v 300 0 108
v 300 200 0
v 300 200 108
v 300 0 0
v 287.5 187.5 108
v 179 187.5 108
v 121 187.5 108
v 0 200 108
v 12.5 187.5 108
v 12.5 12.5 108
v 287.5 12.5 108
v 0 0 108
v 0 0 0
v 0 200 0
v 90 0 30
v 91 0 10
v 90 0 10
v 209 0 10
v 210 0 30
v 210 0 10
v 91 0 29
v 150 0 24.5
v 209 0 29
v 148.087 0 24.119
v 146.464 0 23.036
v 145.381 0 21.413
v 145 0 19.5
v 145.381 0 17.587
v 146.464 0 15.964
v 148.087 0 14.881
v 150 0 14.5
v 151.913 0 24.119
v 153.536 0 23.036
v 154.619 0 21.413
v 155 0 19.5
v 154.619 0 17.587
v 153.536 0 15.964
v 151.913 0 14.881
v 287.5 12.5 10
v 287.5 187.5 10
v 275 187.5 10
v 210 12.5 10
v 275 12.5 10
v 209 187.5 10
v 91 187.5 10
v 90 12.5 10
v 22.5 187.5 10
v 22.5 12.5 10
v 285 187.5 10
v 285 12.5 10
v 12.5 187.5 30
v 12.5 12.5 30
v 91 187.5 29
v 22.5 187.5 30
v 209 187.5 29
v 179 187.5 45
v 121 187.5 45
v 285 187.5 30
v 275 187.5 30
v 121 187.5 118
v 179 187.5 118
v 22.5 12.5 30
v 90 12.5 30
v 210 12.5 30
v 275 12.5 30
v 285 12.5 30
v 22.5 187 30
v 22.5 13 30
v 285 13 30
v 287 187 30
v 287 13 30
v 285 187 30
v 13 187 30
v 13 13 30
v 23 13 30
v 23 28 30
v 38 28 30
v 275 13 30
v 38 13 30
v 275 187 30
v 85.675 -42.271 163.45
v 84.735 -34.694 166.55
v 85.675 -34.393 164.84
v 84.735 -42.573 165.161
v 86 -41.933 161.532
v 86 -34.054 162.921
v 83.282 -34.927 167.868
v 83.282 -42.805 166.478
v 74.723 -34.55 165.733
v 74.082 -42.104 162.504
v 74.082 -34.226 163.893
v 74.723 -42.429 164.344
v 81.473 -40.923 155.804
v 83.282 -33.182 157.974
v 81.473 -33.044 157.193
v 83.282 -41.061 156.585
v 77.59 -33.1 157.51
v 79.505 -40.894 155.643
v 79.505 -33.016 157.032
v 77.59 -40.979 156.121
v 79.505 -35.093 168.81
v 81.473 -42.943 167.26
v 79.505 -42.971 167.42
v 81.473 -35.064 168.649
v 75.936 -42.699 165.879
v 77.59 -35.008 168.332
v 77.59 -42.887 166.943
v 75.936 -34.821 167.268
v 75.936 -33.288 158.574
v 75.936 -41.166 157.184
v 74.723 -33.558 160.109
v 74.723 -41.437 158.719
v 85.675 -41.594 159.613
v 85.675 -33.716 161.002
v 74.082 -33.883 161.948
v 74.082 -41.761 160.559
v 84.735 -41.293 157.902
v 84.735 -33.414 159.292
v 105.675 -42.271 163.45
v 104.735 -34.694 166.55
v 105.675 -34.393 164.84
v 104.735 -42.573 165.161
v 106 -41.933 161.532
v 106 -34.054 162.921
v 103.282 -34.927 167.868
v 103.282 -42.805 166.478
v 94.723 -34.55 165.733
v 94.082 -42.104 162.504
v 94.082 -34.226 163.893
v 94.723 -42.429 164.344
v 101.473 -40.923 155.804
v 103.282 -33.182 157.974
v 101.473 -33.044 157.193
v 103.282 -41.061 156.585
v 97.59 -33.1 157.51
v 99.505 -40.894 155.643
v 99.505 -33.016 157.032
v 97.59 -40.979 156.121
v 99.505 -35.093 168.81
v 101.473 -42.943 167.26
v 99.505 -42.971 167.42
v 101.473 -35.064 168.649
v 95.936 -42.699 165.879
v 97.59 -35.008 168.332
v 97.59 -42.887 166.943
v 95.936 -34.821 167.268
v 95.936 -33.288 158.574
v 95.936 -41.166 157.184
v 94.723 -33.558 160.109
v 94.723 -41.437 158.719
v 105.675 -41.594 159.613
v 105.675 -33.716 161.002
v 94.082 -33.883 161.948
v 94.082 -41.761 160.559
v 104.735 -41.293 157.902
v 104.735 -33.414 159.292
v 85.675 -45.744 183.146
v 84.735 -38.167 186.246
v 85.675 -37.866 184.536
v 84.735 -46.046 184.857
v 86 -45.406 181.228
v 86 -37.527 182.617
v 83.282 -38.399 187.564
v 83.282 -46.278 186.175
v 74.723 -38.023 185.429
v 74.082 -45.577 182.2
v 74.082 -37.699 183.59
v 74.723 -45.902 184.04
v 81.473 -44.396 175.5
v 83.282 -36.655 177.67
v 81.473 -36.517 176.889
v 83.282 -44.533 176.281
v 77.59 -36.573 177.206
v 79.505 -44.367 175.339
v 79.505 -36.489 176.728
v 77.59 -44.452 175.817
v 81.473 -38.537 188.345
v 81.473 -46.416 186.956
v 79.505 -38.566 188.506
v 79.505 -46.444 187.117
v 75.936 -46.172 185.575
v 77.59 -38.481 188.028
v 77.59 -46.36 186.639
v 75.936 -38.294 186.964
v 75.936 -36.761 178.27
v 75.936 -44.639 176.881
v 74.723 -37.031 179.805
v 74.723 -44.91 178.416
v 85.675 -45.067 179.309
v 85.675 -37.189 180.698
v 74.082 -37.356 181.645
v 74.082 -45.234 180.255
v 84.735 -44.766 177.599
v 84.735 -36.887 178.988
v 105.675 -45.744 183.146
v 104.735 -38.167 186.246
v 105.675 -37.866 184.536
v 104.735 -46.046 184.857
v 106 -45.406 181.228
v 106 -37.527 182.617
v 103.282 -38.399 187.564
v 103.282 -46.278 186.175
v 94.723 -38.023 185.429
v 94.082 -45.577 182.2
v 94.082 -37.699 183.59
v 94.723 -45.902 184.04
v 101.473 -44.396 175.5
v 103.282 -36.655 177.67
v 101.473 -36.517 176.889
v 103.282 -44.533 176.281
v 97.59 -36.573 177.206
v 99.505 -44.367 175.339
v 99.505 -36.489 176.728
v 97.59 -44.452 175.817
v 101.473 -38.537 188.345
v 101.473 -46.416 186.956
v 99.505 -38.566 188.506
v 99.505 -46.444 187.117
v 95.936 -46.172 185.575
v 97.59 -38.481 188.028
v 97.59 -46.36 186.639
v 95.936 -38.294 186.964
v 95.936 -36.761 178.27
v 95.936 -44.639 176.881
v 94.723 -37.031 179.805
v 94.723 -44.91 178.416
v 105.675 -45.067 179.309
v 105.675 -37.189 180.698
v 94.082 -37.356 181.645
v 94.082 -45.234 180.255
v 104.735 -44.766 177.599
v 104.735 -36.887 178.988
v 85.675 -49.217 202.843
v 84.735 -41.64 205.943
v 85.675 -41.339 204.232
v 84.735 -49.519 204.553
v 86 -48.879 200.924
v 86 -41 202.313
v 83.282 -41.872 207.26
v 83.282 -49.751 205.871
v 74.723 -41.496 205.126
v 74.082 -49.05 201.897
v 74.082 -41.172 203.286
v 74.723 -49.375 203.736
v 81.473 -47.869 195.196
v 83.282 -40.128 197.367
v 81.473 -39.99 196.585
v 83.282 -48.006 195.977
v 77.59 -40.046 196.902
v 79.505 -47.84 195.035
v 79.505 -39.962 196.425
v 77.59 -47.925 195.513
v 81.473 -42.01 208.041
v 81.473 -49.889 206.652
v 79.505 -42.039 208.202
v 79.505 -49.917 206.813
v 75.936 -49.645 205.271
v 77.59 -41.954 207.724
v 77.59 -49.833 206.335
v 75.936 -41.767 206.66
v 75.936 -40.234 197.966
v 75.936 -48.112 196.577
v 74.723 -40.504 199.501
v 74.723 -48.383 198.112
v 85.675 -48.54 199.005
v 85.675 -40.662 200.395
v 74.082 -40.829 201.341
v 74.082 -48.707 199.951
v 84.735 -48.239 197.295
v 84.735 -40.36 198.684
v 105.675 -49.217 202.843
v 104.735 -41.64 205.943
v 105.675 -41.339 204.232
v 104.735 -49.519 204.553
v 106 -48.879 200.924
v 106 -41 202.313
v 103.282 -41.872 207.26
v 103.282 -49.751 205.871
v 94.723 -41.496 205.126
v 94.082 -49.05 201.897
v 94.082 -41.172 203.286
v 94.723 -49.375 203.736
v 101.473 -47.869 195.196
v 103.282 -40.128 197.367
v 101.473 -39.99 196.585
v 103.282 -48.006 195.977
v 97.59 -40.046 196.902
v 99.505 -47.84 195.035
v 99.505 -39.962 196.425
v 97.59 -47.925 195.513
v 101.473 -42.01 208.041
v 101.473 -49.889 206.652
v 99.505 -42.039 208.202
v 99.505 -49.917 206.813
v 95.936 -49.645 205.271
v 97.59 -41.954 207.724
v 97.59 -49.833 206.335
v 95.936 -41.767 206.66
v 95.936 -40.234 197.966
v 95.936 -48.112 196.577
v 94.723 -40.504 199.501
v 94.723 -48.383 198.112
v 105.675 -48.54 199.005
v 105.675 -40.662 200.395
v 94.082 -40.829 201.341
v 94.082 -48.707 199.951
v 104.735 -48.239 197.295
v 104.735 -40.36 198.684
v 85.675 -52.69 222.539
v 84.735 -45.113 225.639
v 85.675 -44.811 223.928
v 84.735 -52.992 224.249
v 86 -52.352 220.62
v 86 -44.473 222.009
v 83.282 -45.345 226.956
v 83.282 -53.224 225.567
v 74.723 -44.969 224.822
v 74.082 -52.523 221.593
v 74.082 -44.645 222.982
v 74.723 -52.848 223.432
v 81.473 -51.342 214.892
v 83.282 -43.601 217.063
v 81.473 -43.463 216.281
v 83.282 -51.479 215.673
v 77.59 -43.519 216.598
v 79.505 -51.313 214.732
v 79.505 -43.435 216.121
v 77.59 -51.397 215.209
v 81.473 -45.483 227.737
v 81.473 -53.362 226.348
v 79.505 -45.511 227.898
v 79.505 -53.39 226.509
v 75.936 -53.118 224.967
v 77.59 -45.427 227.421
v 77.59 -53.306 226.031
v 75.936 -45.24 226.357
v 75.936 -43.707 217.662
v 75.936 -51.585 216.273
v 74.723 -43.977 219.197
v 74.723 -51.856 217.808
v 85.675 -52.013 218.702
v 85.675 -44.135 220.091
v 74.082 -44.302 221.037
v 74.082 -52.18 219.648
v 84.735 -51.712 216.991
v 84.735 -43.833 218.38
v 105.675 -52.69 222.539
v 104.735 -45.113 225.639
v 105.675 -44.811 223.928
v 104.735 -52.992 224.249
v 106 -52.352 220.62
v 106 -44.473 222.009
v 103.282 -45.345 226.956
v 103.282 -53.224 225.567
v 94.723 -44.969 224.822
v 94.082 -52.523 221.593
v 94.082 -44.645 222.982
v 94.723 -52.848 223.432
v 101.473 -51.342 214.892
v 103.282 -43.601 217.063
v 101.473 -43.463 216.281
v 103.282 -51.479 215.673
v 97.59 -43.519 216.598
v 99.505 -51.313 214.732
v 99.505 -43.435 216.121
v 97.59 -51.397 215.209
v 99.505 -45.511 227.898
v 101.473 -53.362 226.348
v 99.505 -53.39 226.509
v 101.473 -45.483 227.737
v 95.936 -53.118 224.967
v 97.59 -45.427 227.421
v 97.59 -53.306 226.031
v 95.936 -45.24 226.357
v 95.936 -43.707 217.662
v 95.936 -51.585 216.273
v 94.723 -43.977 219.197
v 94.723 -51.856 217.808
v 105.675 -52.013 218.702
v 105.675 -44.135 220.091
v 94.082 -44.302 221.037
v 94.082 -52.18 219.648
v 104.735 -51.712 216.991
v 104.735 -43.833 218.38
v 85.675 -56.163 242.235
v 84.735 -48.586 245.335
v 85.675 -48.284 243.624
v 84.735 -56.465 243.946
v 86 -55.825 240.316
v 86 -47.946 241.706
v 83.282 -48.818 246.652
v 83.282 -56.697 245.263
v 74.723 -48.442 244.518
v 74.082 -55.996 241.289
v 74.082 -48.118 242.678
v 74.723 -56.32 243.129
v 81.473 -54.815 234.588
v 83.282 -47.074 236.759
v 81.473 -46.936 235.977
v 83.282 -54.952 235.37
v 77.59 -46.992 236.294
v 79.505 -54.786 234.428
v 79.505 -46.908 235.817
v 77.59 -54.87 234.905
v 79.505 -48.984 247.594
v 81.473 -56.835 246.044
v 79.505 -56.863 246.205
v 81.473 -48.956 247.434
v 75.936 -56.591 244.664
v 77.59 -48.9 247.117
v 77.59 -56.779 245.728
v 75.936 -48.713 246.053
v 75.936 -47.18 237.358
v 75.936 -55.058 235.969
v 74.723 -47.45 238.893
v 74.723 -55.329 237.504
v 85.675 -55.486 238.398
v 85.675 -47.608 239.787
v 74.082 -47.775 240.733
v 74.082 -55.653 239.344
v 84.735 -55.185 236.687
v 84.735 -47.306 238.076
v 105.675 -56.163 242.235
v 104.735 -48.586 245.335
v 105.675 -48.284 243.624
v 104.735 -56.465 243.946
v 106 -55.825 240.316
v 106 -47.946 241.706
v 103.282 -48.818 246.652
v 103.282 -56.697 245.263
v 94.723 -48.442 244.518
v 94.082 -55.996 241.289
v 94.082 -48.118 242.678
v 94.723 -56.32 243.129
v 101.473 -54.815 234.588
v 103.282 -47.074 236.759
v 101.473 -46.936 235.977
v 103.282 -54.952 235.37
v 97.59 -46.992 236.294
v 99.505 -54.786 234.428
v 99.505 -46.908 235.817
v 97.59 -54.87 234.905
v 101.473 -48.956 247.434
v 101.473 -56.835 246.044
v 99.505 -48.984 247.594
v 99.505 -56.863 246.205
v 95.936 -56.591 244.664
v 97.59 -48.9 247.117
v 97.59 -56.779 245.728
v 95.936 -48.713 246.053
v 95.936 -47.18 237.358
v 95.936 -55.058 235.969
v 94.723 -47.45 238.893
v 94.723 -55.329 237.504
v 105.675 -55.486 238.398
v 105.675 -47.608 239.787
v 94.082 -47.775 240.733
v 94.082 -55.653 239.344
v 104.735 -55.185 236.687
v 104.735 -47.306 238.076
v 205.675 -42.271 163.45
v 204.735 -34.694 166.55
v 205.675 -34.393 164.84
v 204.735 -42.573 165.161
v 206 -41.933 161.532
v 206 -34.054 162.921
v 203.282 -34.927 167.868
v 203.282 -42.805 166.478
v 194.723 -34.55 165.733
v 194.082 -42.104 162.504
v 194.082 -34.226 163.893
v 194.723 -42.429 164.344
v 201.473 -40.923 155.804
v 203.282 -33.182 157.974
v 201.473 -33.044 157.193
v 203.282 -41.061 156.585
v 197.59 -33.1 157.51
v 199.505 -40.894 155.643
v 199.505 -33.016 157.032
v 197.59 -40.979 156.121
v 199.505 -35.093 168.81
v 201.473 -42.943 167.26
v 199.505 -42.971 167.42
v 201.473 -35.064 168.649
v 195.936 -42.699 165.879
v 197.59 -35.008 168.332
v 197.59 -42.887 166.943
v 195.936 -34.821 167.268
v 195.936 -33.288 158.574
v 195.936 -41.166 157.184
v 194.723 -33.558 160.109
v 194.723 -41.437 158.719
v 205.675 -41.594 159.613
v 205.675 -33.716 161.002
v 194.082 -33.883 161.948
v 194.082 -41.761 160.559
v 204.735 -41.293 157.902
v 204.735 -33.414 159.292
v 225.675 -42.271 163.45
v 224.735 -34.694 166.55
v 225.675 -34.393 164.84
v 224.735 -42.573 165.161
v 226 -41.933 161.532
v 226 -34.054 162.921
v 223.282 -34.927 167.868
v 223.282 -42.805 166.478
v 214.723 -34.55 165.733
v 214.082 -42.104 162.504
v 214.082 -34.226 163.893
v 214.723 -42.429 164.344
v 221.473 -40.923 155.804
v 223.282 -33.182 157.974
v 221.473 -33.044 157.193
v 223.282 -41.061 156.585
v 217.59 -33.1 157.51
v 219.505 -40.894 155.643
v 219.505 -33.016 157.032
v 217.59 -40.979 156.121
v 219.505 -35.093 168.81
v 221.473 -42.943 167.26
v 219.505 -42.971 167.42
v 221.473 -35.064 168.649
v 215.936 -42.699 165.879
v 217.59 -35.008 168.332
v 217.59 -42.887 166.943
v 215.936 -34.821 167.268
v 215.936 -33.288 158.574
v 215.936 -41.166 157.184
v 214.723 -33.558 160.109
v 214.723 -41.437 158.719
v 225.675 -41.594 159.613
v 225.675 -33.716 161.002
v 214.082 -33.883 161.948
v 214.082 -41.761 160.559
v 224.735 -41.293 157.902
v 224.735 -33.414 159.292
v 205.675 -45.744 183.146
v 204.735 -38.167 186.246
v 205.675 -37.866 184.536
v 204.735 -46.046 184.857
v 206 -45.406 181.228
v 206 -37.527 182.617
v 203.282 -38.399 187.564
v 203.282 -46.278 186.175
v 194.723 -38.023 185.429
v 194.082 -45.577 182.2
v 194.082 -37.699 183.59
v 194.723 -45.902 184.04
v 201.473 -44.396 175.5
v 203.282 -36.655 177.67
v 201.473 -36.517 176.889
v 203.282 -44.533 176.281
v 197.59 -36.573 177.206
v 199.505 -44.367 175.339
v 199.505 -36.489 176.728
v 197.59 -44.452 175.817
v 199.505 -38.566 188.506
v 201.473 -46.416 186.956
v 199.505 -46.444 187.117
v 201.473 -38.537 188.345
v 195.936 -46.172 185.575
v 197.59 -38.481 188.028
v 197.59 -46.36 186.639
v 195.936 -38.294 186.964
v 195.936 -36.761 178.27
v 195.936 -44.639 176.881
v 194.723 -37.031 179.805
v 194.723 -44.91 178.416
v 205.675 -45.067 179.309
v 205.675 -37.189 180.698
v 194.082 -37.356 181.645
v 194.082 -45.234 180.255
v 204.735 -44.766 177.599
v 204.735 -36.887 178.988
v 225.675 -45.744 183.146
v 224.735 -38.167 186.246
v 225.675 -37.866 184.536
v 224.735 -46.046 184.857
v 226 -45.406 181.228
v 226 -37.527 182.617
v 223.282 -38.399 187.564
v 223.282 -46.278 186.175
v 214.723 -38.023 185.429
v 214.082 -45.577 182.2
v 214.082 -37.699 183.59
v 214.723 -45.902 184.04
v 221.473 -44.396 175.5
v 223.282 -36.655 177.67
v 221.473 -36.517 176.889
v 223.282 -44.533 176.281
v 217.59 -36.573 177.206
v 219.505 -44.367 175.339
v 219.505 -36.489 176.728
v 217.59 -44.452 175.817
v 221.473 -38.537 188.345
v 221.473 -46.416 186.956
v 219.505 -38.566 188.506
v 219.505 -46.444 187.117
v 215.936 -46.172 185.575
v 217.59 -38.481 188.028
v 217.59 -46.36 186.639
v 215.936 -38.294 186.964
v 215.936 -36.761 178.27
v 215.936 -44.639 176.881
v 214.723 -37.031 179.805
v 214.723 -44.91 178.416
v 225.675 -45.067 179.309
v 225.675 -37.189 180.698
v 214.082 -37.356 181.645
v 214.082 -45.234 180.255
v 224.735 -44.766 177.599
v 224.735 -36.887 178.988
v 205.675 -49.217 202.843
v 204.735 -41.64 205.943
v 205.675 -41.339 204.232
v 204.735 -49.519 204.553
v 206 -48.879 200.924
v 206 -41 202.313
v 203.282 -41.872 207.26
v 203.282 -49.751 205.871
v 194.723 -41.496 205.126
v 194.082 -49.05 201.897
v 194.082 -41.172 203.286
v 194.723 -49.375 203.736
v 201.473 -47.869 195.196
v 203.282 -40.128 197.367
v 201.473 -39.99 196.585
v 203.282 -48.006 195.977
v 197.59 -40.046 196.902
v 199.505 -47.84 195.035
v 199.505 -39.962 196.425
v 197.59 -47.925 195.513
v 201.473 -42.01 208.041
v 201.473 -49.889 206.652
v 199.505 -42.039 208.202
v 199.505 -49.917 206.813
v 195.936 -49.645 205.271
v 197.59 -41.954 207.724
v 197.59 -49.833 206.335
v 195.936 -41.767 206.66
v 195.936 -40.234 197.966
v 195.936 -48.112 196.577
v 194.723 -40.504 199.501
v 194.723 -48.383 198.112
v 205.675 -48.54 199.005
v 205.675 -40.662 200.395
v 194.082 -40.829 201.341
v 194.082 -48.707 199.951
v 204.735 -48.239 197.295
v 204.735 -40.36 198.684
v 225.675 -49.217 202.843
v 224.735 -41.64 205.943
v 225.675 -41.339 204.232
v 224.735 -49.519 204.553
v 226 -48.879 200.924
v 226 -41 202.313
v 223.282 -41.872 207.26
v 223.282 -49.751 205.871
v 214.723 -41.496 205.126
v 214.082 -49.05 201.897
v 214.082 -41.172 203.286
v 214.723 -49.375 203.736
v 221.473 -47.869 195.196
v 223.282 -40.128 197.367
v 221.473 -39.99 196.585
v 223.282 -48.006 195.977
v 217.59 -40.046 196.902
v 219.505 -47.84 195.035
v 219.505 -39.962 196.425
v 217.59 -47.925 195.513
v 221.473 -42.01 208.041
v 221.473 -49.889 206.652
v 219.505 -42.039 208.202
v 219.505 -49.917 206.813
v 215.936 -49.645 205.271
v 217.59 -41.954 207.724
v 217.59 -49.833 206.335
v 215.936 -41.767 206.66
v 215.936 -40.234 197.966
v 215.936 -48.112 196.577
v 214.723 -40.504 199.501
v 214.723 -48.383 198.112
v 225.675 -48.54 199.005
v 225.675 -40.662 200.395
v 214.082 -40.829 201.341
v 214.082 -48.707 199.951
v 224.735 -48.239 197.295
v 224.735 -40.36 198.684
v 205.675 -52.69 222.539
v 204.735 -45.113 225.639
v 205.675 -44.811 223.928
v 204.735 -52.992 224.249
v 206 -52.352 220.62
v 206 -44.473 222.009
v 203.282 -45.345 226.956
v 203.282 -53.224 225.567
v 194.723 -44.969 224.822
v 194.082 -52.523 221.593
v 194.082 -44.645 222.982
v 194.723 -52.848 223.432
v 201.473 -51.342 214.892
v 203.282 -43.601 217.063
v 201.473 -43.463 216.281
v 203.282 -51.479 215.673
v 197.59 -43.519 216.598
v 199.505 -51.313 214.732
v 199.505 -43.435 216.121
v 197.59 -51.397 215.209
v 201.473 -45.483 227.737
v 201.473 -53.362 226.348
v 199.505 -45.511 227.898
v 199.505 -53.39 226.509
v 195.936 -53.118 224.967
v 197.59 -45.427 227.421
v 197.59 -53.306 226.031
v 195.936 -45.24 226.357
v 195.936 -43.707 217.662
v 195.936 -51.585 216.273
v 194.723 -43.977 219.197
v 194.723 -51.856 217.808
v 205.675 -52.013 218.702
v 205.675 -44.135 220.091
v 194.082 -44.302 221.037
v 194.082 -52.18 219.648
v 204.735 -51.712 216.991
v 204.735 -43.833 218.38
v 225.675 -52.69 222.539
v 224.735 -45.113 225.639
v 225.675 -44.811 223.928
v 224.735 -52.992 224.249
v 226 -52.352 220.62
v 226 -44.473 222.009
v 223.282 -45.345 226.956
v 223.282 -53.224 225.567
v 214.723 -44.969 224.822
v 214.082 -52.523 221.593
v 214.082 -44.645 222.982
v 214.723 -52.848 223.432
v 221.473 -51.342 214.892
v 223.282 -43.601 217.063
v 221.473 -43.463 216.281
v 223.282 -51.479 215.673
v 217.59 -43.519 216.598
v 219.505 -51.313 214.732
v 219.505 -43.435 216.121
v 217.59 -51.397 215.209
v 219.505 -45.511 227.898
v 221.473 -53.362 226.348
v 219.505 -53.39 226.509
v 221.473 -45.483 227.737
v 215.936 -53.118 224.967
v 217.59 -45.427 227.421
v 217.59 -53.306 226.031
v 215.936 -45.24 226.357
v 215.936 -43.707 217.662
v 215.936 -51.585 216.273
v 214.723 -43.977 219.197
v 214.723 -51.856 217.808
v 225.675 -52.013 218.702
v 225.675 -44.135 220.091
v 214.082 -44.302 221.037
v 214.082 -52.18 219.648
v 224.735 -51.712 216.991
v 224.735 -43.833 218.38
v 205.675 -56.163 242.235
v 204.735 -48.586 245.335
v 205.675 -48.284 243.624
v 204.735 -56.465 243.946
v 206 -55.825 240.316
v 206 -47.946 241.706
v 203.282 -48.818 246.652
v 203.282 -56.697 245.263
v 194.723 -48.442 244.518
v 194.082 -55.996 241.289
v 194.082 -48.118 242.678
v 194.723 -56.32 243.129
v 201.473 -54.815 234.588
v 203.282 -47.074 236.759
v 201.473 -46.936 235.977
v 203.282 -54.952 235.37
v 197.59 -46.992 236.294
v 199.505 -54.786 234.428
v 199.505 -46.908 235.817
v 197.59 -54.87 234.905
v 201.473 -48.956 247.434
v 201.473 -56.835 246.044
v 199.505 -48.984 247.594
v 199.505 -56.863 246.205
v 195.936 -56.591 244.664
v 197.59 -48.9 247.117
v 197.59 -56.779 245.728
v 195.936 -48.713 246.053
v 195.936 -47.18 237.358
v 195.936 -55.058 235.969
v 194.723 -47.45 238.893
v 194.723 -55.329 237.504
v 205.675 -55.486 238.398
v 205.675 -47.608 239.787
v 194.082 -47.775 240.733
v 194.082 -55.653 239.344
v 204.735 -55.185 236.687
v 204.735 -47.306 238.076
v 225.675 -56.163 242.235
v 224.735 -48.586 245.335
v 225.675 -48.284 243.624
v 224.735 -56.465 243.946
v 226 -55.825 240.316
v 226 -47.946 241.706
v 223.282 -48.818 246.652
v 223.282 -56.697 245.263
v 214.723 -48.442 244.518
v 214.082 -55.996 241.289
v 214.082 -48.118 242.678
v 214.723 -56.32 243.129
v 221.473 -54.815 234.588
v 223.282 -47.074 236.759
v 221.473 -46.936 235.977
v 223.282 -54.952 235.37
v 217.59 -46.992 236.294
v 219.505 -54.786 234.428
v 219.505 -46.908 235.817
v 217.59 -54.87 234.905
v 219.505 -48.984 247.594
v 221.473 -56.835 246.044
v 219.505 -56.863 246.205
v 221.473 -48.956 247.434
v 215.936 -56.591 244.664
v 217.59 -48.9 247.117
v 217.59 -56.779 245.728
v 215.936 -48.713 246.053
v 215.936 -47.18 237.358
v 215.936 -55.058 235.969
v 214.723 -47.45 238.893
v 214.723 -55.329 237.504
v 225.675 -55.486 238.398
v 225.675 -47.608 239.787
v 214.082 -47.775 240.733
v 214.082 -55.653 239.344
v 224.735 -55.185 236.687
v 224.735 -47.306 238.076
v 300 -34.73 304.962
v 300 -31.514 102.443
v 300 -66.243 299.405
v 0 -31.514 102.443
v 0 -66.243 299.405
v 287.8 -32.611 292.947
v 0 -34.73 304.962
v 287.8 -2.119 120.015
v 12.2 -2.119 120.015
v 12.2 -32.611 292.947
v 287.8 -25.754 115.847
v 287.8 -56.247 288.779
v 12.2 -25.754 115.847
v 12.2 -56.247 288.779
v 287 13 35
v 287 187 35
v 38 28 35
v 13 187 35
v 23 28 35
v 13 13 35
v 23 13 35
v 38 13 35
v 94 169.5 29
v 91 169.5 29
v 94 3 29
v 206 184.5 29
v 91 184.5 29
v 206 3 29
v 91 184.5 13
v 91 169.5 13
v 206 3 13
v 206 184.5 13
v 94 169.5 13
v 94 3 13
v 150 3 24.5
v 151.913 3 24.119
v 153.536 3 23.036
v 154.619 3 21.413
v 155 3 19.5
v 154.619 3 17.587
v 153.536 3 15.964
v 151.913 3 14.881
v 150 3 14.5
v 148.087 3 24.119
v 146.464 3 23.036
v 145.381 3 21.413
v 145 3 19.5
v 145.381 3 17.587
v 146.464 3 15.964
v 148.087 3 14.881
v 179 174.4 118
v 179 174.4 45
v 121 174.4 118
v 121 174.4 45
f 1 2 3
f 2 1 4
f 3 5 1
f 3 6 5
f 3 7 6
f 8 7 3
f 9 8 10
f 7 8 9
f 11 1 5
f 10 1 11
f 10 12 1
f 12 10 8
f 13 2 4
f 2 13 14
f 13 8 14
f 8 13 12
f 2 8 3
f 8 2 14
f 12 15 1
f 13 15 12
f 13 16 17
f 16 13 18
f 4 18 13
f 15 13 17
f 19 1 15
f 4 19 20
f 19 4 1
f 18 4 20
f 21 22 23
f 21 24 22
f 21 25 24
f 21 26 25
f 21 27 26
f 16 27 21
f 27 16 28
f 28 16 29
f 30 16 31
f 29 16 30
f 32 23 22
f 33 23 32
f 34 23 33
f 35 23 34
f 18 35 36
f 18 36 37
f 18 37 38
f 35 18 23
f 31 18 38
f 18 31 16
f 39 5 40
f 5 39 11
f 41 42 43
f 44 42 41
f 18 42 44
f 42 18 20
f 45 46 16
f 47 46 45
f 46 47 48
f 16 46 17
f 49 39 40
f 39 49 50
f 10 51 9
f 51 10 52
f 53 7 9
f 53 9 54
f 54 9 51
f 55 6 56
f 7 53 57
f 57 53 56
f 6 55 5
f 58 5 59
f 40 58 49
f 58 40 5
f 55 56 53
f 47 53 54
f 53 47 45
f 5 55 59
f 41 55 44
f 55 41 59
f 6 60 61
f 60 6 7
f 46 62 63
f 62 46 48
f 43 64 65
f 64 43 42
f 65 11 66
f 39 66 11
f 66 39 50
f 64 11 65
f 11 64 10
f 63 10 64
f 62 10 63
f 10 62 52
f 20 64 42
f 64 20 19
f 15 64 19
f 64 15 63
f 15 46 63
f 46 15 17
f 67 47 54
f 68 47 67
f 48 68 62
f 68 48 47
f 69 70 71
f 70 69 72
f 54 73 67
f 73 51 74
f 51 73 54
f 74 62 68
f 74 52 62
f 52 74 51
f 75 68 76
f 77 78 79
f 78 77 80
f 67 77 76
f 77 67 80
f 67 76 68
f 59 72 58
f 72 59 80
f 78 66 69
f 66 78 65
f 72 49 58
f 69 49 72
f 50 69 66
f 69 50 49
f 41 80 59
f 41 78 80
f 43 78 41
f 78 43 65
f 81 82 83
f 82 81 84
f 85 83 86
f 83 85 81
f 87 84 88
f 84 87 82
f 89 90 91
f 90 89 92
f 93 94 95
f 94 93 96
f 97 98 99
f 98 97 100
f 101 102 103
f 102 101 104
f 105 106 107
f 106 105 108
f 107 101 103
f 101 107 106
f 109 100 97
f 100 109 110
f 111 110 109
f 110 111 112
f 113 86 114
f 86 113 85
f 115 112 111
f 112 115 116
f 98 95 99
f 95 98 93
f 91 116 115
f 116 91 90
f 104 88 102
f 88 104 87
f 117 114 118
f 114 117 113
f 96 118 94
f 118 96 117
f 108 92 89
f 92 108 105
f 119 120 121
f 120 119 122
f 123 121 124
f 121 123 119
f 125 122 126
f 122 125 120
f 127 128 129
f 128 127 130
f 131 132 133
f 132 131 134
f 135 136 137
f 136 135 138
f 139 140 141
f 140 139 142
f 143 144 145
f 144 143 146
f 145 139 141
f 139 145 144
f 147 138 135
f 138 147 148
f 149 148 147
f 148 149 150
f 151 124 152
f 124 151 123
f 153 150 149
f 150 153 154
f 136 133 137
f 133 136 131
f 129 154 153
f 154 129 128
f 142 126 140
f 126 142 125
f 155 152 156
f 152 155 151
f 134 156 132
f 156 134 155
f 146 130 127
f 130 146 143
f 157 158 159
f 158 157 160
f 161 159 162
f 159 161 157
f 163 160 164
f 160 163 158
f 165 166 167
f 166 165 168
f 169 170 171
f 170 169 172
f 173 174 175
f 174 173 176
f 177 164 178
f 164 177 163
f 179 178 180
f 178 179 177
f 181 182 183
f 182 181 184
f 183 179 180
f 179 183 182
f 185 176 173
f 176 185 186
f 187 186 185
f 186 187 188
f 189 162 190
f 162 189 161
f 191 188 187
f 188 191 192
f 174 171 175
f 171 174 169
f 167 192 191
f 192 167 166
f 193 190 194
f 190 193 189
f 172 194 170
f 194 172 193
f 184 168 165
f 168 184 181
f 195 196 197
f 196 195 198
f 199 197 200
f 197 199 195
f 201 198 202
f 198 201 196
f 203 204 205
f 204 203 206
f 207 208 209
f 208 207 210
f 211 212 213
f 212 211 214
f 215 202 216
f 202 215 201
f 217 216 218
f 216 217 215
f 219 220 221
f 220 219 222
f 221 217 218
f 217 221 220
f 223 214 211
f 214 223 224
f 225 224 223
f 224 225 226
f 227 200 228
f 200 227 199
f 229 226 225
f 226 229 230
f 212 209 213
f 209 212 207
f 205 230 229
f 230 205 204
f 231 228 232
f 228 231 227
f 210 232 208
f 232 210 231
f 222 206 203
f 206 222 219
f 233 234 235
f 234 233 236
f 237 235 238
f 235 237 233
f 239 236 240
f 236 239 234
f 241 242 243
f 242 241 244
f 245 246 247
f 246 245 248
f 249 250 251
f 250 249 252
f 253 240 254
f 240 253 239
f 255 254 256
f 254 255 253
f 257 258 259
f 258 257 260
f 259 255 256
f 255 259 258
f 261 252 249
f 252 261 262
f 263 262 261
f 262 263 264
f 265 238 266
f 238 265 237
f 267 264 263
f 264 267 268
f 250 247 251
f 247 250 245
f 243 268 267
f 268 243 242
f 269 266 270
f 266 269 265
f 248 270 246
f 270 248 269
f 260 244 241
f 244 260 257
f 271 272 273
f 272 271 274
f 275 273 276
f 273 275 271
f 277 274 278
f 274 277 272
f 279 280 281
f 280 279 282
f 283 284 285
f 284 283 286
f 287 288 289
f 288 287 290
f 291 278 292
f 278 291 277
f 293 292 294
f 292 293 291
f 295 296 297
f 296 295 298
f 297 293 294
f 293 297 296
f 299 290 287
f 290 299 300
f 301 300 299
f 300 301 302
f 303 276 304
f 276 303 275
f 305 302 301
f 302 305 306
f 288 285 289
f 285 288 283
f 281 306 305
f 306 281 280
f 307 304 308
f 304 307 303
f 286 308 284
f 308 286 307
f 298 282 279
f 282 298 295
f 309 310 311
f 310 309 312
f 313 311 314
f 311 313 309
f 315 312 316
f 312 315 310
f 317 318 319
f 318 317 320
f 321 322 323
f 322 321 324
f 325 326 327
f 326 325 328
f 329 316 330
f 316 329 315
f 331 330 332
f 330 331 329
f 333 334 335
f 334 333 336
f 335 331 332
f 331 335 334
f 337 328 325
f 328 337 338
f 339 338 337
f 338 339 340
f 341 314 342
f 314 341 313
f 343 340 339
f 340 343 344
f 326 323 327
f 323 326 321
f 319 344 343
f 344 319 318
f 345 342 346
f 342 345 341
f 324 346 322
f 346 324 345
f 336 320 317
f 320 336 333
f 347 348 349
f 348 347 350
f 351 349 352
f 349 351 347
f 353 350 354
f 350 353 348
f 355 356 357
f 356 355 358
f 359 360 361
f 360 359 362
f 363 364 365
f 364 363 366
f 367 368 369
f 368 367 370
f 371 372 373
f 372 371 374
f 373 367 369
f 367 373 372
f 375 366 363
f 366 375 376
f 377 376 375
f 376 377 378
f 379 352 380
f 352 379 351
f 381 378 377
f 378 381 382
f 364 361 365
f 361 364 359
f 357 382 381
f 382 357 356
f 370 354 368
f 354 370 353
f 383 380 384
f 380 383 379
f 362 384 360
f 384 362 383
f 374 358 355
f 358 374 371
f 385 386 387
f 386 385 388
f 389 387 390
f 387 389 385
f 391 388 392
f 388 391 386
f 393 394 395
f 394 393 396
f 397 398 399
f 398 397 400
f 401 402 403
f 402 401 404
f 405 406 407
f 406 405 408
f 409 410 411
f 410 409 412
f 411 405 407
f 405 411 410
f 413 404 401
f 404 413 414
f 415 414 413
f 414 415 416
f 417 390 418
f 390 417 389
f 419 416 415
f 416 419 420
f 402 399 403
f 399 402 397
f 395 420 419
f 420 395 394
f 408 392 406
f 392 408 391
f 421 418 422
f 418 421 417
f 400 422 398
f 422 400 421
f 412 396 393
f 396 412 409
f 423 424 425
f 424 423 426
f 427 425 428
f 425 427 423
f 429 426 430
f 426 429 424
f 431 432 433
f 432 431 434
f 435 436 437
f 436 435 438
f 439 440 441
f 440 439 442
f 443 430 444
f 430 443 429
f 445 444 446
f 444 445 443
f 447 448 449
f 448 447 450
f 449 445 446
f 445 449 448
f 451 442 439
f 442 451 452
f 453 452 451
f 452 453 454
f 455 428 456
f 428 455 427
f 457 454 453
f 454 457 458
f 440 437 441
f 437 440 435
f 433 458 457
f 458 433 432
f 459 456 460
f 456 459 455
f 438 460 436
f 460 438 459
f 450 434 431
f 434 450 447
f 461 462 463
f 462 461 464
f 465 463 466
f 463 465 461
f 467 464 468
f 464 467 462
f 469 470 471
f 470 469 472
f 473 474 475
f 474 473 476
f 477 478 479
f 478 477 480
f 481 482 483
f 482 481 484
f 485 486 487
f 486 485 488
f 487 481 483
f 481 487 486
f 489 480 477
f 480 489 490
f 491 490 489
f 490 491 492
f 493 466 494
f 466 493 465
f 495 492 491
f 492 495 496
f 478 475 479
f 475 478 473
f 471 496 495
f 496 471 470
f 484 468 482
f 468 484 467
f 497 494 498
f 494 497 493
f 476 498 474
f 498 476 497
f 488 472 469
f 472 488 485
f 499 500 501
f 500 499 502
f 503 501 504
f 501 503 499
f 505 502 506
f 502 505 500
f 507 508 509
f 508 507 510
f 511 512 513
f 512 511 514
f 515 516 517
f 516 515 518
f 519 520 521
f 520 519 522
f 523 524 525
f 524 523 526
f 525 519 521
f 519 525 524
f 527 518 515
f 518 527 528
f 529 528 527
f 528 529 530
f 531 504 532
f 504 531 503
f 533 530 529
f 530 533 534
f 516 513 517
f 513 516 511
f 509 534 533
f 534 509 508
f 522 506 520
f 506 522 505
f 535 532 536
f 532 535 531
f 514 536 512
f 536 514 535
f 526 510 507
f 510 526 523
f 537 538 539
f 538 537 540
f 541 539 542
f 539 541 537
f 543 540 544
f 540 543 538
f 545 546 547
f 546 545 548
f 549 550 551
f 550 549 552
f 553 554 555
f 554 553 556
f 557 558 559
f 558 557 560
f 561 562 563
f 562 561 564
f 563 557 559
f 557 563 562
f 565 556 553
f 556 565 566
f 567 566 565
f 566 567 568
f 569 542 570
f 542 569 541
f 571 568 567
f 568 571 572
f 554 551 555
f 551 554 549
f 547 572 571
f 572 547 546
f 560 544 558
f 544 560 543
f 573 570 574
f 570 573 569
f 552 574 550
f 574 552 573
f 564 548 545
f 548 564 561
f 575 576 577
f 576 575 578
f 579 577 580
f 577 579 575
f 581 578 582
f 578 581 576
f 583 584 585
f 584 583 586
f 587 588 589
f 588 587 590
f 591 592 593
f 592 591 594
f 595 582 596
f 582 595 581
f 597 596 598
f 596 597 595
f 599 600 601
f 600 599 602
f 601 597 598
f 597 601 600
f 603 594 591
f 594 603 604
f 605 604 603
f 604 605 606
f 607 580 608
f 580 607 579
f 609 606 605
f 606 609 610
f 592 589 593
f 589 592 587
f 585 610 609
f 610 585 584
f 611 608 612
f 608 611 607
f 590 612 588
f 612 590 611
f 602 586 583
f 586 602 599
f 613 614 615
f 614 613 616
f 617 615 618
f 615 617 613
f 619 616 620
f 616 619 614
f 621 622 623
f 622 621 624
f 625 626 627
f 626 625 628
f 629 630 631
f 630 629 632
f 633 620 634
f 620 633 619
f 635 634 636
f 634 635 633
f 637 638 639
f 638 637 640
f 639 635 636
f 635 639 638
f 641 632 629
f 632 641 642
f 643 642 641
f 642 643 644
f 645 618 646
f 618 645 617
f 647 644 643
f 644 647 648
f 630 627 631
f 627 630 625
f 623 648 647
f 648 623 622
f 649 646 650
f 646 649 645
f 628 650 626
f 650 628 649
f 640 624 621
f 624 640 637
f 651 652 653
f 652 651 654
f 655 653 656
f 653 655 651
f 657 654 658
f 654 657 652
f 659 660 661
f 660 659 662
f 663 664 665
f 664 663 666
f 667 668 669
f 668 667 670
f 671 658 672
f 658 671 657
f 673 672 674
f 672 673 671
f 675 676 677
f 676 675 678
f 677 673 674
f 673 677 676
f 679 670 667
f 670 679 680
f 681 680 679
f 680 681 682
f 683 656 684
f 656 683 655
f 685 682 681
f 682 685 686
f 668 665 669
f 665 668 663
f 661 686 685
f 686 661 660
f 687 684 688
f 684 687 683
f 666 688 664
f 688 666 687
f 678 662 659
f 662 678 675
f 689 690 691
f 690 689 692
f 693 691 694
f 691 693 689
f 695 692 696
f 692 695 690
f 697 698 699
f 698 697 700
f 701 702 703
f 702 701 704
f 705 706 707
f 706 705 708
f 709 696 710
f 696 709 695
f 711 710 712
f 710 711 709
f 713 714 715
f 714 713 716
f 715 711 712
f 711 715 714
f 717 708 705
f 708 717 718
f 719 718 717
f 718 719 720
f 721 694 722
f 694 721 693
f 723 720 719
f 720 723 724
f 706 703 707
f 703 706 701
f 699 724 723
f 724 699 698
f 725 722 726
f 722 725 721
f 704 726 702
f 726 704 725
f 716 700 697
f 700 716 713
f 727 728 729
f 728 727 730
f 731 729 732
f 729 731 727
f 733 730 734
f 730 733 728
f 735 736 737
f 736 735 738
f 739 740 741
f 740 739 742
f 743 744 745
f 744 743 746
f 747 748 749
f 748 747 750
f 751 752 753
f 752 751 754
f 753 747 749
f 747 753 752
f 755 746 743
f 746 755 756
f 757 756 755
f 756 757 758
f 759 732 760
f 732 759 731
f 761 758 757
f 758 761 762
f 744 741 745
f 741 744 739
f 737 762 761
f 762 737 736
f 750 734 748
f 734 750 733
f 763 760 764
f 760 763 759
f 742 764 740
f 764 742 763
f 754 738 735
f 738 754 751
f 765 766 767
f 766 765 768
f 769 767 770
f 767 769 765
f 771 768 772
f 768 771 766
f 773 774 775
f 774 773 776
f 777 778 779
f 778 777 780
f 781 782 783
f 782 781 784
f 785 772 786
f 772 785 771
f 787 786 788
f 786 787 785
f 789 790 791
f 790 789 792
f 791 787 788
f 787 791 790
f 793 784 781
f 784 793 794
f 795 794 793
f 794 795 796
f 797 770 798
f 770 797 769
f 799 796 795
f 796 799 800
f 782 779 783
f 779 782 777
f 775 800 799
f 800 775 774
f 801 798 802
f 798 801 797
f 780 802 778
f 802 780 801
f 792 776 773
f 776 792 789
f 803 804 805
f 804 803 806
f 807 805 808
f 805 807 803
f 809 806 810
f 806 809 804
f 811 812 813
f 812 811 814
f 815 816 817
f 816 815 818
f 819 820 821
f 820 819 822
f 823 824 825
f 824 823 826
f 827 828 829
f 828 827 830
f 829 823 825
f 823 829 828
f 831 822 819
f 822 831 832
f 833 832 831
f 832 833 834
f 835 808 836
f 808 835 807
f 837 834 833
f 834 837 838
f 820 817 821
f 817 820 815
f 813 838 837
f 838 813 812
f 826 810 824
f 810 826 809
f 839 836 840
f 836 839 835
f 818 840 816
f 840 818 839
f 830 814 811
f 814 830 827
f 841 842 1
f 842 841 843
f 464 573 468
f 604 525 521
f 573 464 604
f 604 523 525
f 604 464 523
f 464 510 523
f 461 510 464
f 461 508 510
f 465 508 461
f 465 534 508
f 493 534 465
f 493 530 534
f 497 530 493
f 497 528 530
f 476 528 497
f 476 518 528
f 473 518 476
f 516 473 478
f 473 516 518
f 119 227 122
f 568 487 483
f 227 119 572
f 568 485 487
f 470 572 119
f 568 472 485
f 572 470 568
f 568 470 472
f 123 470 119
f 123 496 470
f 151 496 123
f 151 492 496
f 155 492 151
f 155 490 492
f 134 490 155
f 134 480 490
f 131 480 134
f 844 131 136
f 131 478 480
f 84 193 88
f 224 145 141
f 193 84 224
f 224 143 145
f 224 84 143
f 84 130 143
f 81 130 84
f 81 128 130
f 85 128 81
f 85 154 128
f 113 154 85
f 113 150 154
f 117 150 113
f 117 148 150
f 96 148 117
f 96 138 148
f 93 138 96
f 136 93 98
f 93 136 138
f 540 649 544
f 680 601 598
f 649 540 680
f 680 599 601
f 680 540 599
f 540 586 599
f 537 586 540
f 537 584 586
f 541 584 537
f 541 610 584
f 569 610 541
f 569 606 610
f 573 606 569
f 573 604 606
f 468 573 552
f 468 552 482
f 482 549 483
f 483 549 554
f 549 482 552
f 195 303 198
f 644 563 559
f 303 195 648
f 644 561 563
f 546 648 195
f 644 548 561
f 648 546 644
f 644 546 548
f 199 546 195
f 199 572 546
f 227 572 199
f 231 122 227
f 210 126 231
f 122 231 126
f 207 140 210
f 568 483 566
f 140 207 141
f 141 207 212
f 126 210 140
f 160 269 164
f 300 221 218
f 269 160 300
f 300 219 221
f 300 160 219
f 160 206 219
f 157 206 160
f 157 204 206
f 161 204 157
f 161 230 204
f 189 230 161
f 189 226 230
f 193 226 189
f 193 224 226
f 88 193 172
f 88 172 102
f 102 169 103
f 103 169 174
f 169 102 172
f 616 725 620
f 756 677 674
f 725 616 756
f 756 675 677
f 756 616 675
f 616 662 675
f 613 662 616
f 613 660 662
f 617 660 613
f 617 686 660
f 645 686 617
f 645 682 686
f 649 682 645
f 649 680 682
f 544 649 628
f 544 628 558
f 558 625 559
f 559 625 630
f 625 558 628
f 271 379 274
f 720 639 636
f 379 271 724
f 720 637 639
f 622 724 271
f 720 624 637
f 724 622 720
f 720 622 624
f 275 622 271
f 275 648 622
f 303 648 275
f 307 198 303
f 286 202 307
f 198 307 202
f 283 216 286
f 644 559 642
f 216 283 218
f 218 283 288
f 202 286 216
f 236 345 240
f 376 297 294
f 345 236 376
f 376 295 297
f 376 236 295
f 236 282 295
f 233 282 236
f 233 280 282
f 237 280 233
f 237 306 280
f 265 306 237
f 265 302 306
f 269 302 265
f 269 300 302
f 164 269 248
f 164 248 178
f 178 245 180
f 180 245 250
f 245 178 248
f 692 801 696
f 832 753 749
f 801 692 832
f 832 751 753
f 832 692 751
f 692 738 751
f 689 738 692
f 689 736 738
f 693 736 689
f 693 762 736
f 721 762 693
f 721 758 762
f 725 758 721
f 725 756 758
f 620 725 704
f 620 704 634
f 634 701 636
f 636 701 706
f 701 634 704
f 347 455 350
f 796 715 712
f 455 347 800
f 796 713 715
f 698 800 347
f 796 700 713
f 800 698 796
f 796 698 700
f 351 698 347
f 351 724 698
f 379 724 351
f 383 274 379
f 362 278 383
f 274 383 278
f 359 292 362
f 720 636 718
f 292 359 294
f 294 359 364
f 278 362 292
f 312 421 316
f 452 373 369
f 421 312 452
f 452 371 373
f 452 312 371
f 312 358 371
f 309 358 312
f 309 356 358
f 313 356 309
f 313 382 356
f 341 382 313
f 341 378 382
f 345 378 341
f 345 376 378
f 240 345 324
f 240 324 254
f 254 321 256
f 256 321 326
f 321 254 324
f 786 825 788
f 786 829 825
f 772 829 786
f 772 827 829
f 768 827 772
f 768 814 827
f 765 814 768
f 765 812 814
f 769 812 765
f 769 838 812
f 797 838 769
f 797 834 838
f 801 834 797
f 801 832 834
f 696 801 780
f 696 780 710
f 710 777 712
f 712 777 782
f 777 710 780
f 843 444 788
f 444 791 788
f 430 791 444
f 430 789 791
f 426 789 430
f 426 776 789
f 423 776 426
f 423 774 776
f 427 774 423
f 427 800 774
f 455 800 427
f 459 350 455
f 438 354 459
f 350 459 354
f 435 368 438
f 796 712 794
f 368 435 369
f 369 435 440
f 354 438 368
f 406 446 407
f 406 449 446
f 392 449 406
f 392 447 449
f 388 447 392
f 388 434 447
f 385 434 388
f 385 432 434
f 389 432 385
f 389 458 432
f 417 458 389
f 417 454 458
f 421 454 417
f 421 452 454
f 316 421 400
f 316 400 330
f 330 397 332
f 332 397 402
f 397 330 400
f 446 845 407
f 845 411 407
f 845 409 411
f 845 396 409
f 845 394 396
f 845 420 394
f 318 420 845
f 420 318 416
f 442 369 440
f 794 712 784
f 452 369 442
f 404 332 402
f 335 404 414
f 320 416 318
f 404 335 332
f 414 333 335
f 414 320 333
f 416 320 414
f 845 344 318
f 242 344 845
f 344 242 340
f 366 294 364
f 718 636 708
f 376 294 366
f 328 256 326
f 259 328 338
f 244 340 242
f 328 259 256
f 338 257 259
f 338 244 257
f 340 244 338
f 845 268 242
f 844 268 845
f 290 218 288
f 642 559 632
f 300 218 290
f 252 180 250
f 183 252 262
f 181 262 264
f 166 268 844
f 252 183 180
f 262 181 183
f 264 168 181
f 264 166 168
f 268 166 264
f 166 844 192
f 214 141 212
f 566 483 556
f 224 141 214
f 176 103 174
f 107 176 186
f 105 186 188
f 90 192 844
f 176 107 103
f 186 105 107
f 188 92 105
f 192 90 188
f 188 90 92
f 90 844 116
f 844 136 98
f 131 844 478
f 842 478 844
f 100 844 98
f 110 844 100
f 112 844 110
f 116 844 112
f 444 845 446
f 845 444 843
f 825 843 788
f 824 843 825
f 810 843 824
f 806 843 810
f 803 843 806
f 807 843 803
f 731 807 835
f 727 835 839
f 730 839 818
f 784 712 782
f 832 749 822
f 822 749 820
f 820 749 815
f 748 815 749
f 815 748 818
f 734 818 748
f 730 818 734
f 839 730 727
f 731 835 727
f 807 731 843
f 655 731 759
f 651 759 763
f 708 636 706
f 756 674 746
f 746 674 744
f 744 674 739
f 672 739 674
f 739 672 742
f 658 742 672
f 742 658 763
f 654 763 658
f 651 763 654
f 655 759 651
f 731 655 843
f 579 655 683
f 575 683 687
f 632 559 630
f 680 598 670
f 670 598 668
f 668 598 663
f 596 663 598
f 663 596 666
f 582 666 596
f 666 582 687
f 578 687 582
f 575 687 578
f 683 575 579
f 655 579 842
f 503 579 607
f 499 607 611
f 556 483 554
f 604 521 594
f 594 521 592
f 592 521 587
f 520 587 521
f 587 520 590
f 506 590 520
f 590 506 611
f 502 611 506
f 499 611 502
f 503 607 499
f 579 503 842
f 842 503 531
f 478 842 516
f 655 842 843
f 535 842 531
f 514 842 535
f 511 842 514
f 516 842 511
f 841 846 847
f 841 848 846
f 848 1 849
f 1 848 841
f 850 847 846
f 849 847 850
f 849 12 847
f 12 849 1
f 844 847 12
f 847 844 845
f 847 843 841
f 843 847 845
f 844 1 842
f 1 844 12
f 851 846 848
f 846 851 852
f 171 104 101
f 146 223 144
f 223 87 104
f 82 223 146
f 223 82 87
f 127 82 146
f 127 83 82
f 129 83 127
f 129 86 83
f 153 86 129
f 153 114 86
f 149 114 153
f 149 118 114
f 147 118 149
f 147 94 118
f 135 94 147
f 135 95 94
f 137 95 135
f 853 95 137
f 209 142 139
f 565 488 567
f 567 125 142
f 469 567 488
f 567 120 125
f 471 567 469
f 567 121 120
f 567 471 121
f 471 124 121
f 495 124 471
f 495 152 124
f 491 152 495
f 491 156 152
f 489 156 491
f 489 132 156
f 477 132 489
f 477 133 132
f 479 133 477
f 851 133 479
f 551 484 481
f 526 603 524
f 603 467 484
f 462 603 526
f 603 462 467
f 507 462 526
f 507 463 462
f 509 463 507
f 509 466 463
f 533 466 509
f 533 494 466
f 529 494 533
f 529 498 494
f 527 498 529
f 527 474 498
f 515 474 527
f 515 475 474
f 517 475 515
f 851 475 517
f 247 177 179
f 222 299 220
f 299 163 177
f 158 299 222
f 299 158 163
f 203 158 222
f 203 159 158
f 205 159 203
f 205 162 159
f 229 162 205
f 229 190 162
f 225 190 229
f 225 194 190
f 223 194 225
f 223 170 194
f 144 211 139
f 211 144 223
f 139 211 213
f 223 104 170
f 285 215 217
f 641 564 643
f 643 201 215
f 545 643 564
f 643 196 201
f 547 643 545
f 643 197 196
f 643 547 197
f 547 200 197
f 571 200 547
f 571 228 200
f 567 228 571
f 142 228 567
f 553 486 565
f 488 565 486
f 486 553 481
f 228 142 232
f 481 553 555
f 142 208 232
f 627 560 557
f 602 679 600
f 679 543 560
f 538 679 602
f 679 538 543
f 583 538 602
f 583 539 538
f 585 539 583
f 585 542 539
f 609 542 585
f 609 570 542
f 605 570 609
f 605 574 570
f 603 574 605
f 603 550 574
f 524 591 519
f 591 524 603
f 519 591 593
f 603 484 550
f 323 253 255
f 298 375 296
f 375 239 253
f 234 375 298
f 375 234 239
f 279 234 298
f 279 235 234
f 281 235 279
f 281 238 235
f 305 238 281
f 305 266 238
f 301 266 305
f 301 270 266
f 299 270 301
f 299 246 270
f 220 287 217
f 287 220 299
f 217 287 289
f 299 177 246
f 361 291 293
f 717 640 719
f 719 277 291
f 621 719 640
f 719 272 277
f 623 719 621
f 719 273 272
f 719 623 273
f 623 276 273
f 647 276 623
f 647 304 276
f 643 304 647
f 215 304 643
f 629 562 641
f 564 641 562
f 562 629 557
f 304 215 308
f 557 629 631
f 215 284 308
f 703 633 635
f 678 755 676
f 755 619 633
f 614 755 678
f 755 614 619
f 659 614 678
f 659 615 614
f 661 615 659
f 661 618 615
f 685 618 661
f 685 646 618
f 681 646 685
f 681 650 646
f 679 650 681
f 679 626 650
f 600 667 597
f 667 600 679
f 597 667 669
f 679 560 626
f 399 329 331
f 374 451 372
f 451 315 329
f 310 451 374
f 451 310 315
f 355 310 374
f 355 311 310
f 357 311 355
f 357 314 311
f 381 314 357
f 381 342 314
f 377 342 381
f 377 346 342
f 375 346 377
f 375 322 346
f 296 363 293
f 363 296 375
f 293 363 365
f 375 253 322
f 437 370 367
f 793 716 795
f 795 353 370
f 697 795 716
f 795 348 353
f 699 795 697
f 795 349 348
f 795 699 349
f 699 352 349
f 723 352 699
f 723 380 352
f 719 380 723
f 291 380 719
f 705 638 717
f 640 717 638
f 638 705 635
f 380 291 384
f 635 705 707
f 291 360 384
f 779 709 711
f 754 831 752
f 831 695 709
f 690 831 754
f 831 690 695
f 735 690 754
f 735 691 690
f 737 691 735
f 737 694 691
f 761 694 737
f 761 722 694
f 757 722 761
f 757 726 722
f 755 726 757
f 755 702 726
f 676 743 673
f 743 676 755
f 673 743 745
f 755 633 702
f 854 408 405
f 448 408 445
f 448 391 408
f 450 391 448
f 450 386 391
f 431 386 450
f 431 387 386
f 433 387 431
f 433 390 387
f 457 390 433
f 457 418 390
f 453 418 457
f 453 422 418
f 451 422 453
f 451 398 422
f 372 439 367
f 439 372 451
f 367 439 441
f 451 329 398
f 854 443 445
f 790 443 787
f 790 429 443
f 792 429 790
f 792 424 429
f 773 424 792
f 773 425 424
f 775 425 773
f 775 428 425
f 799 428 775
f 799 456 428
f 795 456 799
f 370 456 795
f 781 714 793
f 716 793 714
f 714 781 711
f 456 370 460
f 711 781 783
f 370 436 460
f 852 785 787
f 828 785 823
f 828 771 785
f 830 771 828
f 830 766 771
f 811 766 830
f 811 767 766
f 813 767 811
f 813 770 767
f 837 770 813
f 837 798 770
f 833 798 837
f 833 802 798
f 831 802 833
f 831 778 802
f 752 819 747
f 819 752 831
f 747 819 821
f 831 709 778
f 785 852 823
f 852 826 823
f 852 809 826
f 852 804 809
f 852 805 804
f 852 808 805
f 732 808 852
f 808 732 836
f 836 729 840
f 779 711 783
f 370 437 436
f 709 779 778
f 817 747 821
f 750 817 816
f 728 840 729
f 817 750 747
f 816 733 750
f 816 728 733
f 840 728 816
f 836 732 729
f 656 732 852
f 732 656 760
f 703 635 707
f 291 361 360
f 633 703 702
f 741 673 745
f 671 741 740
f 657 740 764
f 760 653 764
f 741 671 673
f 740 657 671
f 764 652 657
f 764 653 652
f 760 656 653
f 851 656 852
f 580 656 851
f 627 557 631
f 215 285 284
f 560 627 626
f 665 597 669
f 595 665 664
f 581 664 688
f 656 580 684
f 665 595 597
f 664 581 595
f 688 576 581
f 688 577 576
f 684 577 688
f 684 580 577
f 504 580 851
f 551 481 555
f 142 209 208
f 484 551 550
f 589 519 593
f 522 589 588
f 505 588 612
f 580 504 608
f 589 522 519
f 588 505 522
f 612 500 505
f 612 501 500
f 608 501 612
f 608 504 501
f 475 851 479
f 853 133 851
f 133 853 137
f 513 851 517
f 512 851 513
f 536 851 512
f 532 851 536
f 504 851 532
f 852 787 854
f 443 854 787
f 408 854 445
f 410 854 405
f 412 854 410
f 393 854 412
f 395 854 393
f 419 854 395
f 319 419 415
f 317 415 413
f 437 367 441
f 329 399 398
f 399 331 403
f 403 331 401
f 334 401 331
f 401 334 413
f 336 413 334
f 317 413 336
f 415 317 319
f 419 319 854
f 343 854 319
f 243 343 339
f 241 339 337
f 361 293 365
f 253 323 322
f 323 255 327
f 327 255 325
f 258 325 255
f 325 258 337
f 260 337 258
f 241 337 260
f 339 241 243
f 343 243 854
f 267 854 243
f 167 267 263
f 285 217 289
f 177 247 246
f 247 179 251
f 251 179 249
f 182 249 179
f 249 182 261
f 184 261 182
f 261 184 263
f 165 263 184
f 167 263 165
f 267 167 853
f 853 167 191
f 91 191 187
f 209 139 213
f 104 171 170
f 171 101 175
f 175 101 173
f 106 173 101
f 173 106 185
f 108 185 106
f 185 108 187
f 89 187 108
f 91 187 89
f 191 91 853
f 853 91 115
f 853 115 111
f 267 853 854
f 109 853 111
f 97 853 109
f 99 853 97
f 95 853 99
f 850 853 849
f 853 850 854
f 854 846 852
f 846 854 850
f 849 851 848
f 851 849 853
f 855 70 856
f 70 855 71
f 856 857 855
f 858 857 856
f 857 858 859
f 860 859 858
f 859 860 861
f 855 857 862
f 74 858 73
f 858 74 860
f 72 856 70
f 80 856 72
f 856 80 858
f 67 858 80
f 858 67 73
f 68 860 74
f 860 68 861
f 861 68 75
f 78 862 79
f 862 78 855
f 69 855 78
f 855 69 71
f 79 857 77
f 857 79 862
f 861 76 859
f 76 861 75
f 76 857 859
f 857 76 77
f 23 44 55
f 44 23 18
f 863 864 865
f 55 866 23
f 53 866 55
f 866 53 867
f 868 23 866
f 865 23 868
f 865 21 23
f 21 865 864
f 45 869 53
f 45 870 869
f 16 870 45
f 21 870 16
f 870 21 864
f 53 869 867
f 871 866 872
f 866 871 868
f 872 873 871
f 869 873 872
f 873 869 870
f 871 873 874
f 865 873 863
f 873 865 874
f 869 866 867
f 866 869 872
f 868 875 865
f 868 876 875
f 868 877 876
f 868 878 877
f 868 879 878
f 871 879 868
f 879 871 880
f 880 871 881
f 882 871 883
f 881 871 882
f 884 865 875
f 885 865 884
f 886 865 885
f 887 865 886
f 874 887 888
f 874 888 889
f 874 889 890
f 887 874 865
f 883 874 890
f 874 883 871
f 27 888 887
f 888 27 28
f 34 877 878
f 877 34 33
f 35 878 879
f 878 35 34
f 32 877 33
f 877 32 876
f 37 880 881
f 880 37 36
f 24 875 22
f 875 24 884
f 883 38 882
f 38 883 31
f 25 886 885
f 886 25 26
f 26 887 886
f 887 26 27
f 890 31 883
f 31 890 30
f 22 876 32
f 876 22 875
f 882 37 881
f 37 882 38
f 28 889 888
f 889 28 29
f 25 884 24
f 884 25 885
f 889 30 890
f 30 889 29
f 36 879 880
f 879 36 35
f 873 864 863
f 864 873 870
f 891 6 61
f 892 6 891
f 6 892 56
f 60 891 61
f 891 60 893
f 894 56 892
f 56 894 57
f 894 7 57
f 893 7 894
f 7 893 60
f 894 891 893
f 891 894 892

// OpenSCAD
// Creative Deco wooden box with false bottom, secret drawer and RCA cutouts in lid
// Outer size: 300 x 200 x 140 mm

// ---------- Parameters ----------
// Master dimensions
outer_len = 300;     // outer length (X, mm)
outer_w   = 200;     // outer width (Y, mm)
outer_h   = 140;     // outer height (Z, mm)

// Wall thickness
wall_x = 12.5;       // left/right walls (X)
wall_y = 12.5;       // front/back walls (Y)

// Base and lid
base_th = 10;        // bottom thickness
lid_th  = 32;        // lid block thickness

// Hidden compartment
hidden_h        = 20;   // hidden drawer height (Z)
false_bottom_th = 5;    // false bottom thickness
drawer_len      = 120;  // drawer length in X direction (< inner_len)
drawer_clear    = 1.0;  // clearance for drawer (mm)
drawer_wall     = 3;    // wall thickness of drawer
drawer_power_hole_d = 10;

false_bottom_holder_width = 10;

// Cable
cable_cutout = 15;

// Derived dimensions
inner_len = outer_len - 2*wall_x;
inner_w   = outer_w   - 2*wall_y;
inner_h   = outer_h - base_th - lid_th - hidden_h - false_bottom_th;

lid_cutout = 24;         // hollow inside lid
lid_clear  = 0.6;        // clearance for lid/lip

// RCA cutouts (lid)
rca_hole_d = 12;         // hole diameter for RCA jacks
rca_cols   = 2;          // number of columns per block
rca_rows   = 5;          // number of rows per block
rca_pitch_x = 20;        // spacing between columns
rca_pitch_y = 20;        // spacing between rows
rca_margin_side  = 80;   // margin from left/right side

// Display
lid_open_angle = 100; // degrees, 0 = closed, 90 = open

// Lock
lock_ht=73;
lock_width=13.1;
lock_len=58;
lock_shift=10;

// ---------- Feature toggles ----------
show_box_body     = true;
show_lid          = true;
show_false_bottom = true;
show_drawer       = true;
show_drawer_cut   = true;
show_rca_cutouts  = true;

c0=0.01+0;

// ---------- Dimension printout ----------
echo("Inner length (X) =", inner_len, "mm");
echo("Inner width (Y)  =", inner_w, "mm");
echo("Visible inner height (Z) =", inner_h, "mm");
echo("Hidden drawer height (Z) =", hidden_h, "mm");
echo("False bottom thickness (Z) =", false_bottom_th, "mm");
echo("Total internal height (Z) =", inner_h + hidden_h + false_bottom_th, "mm");

echo("lock space left", inner_h - lock_ht+lock_shift);

// ---------- Modules ----------
module box_body(){
    difference(){
        // Outer shell without lid
        cube([outer_len, outer_w, outer_h - lid_th], center=false);

        // Hollow interior from base up to lid
        translate([wall_x, wall_y, base_th])
            cube([inner_len, inner_w, outer_h - lid_th - base_th + c0], center=false);

        // Rear cutout for drawer access
        if (show_drawer_cut)
            translate([wall_x + inner_len/2 - drawer_len/2, -c0, base_th])
                cube([drawer_len, wall_y+2+c0, hidden_h], center=false);
    }
    
    translate([wall_x, wall_y, base_th])
        cube([false_bottom_holder_width, inner_w, hidden_h]);
    translate([inner_len, wall_y, base_th])
        cube([false_bottom_holder_width, inner_w, hidden_h]);

}

module lock() {
    translate([outer_len/2-lock_len/2,
               wall_y+inner_w-lock_width,
               base_th + hidden_h + false_bottom_th+inner_h - lock_ht + lock_shift])
        cube([lock_len, lock_width, lock_ht], center=false);
}

module lid_block(){
    difference(){
        cube([outer_len, outer_w, lid_th], center=false);

        // Hollow inside lid
        translate([wall_x-lid_clear/2, wall_y-lid_clear/2, -c0])
            cube([inner_len+lid_clear, inner_w+lid_clear, lid_cutout+c0], center=false);

        // RCA cutouts in lid
        if (show_rca_cutouts)
            translate([0, 0, -lid_th])
            rca_cutouts();
    }
}

module drawer(){
    difference(){
        // Outer size = hidden space minus clearance
        cube([drawer_len-2*drawer_clear,
              inner_w + wall_y,
              hidden_h-drawer_clear], center=false);

        // Inner hollow, top open
        translate([drawer_wall, drawer_wall, drawer_wall])
            cube([drawer_len-2*drawer_clear-2*drawer_wall,
                  inner_w+wall_y - drawer_wall*2,
                  hidden_h-drawer_clear], center=false);

        // Power cable hole in front
        translate([(drawer_len-2*drawer_clear)/2,
                   drawer_wall+c0,
                   (hidden_h-drawer_clear)/2])
            rotate([90, 0, 0])
            cylinder(d=drawer_power_hole_d, h=drawer_wall+2*c0);
        
        // Cable
        translate([-c0, drawer_wall-cable_cutout+inner_w+wall_y - drawer_wall*2, drawer_wall])
        cube([drawer_wall+2*c0, cable_cutout, hidden_h+c0]);
    }
}

module false_bottom(){
    // Plate above the hidden drawer with clearance
    translate([wall_x+0.5, wall_y+0.5, base_th + hidden_h])
        difference() {
            cube([inner_len-1, inner_w-1, false_bottom_th], center=false);
            translate([false_bottom_holder_width, 0, -c0])
                cube([cable_cutout, cable_cutout, false_bottom_th+2*c0]);
        }
}

// RCA cutout blocks (centered along Y axis of lid)
module rca_block(x_offset){
    total_height = (rca_rows-1)*rca_pitch_y;
    y_start = outer_w/2 - total_height/2;
    for (row=[0:rca_rows-1]){
        for (col=[0:rca_cols-1]){
            translate([x_offset + col*rca_pitch_x,
                       y_start + row*rca_pitch_y,
                       lid_th - c0])
                cylinder(d=rca_hole_d, h=lid_th+2*c0, center=false);
        }
    }
}

module rca_cutouts(){
    // Left block
    rca_block(rca_margin_side);
    // Right block
    rca_block(outer_len - rca_margin_side - (rca_cols-1)*rca_pitch_x);
}

// ---------- Assembly ----------
module assembly(){
    if (show_box_body)
        color("burlywood") box_body();

    if (show_lid)
        translate([0,0,outer_h - lid_th])
            rotate([lid_open_angle,0,0])
                color("sienna") lid_block();

    if (show_false_bottom)
        color("saddlebrown") false_bottom();

    if (show_drawer)
        translate([wall_x + inner_len/2 - drawer_len/2 + drawer_clear,
                   0,
                   base_th])
            color("peru") drawer();

    // Lock vorne
    color("gray") lock();
}

// ---------- Main ----------
assembly();
